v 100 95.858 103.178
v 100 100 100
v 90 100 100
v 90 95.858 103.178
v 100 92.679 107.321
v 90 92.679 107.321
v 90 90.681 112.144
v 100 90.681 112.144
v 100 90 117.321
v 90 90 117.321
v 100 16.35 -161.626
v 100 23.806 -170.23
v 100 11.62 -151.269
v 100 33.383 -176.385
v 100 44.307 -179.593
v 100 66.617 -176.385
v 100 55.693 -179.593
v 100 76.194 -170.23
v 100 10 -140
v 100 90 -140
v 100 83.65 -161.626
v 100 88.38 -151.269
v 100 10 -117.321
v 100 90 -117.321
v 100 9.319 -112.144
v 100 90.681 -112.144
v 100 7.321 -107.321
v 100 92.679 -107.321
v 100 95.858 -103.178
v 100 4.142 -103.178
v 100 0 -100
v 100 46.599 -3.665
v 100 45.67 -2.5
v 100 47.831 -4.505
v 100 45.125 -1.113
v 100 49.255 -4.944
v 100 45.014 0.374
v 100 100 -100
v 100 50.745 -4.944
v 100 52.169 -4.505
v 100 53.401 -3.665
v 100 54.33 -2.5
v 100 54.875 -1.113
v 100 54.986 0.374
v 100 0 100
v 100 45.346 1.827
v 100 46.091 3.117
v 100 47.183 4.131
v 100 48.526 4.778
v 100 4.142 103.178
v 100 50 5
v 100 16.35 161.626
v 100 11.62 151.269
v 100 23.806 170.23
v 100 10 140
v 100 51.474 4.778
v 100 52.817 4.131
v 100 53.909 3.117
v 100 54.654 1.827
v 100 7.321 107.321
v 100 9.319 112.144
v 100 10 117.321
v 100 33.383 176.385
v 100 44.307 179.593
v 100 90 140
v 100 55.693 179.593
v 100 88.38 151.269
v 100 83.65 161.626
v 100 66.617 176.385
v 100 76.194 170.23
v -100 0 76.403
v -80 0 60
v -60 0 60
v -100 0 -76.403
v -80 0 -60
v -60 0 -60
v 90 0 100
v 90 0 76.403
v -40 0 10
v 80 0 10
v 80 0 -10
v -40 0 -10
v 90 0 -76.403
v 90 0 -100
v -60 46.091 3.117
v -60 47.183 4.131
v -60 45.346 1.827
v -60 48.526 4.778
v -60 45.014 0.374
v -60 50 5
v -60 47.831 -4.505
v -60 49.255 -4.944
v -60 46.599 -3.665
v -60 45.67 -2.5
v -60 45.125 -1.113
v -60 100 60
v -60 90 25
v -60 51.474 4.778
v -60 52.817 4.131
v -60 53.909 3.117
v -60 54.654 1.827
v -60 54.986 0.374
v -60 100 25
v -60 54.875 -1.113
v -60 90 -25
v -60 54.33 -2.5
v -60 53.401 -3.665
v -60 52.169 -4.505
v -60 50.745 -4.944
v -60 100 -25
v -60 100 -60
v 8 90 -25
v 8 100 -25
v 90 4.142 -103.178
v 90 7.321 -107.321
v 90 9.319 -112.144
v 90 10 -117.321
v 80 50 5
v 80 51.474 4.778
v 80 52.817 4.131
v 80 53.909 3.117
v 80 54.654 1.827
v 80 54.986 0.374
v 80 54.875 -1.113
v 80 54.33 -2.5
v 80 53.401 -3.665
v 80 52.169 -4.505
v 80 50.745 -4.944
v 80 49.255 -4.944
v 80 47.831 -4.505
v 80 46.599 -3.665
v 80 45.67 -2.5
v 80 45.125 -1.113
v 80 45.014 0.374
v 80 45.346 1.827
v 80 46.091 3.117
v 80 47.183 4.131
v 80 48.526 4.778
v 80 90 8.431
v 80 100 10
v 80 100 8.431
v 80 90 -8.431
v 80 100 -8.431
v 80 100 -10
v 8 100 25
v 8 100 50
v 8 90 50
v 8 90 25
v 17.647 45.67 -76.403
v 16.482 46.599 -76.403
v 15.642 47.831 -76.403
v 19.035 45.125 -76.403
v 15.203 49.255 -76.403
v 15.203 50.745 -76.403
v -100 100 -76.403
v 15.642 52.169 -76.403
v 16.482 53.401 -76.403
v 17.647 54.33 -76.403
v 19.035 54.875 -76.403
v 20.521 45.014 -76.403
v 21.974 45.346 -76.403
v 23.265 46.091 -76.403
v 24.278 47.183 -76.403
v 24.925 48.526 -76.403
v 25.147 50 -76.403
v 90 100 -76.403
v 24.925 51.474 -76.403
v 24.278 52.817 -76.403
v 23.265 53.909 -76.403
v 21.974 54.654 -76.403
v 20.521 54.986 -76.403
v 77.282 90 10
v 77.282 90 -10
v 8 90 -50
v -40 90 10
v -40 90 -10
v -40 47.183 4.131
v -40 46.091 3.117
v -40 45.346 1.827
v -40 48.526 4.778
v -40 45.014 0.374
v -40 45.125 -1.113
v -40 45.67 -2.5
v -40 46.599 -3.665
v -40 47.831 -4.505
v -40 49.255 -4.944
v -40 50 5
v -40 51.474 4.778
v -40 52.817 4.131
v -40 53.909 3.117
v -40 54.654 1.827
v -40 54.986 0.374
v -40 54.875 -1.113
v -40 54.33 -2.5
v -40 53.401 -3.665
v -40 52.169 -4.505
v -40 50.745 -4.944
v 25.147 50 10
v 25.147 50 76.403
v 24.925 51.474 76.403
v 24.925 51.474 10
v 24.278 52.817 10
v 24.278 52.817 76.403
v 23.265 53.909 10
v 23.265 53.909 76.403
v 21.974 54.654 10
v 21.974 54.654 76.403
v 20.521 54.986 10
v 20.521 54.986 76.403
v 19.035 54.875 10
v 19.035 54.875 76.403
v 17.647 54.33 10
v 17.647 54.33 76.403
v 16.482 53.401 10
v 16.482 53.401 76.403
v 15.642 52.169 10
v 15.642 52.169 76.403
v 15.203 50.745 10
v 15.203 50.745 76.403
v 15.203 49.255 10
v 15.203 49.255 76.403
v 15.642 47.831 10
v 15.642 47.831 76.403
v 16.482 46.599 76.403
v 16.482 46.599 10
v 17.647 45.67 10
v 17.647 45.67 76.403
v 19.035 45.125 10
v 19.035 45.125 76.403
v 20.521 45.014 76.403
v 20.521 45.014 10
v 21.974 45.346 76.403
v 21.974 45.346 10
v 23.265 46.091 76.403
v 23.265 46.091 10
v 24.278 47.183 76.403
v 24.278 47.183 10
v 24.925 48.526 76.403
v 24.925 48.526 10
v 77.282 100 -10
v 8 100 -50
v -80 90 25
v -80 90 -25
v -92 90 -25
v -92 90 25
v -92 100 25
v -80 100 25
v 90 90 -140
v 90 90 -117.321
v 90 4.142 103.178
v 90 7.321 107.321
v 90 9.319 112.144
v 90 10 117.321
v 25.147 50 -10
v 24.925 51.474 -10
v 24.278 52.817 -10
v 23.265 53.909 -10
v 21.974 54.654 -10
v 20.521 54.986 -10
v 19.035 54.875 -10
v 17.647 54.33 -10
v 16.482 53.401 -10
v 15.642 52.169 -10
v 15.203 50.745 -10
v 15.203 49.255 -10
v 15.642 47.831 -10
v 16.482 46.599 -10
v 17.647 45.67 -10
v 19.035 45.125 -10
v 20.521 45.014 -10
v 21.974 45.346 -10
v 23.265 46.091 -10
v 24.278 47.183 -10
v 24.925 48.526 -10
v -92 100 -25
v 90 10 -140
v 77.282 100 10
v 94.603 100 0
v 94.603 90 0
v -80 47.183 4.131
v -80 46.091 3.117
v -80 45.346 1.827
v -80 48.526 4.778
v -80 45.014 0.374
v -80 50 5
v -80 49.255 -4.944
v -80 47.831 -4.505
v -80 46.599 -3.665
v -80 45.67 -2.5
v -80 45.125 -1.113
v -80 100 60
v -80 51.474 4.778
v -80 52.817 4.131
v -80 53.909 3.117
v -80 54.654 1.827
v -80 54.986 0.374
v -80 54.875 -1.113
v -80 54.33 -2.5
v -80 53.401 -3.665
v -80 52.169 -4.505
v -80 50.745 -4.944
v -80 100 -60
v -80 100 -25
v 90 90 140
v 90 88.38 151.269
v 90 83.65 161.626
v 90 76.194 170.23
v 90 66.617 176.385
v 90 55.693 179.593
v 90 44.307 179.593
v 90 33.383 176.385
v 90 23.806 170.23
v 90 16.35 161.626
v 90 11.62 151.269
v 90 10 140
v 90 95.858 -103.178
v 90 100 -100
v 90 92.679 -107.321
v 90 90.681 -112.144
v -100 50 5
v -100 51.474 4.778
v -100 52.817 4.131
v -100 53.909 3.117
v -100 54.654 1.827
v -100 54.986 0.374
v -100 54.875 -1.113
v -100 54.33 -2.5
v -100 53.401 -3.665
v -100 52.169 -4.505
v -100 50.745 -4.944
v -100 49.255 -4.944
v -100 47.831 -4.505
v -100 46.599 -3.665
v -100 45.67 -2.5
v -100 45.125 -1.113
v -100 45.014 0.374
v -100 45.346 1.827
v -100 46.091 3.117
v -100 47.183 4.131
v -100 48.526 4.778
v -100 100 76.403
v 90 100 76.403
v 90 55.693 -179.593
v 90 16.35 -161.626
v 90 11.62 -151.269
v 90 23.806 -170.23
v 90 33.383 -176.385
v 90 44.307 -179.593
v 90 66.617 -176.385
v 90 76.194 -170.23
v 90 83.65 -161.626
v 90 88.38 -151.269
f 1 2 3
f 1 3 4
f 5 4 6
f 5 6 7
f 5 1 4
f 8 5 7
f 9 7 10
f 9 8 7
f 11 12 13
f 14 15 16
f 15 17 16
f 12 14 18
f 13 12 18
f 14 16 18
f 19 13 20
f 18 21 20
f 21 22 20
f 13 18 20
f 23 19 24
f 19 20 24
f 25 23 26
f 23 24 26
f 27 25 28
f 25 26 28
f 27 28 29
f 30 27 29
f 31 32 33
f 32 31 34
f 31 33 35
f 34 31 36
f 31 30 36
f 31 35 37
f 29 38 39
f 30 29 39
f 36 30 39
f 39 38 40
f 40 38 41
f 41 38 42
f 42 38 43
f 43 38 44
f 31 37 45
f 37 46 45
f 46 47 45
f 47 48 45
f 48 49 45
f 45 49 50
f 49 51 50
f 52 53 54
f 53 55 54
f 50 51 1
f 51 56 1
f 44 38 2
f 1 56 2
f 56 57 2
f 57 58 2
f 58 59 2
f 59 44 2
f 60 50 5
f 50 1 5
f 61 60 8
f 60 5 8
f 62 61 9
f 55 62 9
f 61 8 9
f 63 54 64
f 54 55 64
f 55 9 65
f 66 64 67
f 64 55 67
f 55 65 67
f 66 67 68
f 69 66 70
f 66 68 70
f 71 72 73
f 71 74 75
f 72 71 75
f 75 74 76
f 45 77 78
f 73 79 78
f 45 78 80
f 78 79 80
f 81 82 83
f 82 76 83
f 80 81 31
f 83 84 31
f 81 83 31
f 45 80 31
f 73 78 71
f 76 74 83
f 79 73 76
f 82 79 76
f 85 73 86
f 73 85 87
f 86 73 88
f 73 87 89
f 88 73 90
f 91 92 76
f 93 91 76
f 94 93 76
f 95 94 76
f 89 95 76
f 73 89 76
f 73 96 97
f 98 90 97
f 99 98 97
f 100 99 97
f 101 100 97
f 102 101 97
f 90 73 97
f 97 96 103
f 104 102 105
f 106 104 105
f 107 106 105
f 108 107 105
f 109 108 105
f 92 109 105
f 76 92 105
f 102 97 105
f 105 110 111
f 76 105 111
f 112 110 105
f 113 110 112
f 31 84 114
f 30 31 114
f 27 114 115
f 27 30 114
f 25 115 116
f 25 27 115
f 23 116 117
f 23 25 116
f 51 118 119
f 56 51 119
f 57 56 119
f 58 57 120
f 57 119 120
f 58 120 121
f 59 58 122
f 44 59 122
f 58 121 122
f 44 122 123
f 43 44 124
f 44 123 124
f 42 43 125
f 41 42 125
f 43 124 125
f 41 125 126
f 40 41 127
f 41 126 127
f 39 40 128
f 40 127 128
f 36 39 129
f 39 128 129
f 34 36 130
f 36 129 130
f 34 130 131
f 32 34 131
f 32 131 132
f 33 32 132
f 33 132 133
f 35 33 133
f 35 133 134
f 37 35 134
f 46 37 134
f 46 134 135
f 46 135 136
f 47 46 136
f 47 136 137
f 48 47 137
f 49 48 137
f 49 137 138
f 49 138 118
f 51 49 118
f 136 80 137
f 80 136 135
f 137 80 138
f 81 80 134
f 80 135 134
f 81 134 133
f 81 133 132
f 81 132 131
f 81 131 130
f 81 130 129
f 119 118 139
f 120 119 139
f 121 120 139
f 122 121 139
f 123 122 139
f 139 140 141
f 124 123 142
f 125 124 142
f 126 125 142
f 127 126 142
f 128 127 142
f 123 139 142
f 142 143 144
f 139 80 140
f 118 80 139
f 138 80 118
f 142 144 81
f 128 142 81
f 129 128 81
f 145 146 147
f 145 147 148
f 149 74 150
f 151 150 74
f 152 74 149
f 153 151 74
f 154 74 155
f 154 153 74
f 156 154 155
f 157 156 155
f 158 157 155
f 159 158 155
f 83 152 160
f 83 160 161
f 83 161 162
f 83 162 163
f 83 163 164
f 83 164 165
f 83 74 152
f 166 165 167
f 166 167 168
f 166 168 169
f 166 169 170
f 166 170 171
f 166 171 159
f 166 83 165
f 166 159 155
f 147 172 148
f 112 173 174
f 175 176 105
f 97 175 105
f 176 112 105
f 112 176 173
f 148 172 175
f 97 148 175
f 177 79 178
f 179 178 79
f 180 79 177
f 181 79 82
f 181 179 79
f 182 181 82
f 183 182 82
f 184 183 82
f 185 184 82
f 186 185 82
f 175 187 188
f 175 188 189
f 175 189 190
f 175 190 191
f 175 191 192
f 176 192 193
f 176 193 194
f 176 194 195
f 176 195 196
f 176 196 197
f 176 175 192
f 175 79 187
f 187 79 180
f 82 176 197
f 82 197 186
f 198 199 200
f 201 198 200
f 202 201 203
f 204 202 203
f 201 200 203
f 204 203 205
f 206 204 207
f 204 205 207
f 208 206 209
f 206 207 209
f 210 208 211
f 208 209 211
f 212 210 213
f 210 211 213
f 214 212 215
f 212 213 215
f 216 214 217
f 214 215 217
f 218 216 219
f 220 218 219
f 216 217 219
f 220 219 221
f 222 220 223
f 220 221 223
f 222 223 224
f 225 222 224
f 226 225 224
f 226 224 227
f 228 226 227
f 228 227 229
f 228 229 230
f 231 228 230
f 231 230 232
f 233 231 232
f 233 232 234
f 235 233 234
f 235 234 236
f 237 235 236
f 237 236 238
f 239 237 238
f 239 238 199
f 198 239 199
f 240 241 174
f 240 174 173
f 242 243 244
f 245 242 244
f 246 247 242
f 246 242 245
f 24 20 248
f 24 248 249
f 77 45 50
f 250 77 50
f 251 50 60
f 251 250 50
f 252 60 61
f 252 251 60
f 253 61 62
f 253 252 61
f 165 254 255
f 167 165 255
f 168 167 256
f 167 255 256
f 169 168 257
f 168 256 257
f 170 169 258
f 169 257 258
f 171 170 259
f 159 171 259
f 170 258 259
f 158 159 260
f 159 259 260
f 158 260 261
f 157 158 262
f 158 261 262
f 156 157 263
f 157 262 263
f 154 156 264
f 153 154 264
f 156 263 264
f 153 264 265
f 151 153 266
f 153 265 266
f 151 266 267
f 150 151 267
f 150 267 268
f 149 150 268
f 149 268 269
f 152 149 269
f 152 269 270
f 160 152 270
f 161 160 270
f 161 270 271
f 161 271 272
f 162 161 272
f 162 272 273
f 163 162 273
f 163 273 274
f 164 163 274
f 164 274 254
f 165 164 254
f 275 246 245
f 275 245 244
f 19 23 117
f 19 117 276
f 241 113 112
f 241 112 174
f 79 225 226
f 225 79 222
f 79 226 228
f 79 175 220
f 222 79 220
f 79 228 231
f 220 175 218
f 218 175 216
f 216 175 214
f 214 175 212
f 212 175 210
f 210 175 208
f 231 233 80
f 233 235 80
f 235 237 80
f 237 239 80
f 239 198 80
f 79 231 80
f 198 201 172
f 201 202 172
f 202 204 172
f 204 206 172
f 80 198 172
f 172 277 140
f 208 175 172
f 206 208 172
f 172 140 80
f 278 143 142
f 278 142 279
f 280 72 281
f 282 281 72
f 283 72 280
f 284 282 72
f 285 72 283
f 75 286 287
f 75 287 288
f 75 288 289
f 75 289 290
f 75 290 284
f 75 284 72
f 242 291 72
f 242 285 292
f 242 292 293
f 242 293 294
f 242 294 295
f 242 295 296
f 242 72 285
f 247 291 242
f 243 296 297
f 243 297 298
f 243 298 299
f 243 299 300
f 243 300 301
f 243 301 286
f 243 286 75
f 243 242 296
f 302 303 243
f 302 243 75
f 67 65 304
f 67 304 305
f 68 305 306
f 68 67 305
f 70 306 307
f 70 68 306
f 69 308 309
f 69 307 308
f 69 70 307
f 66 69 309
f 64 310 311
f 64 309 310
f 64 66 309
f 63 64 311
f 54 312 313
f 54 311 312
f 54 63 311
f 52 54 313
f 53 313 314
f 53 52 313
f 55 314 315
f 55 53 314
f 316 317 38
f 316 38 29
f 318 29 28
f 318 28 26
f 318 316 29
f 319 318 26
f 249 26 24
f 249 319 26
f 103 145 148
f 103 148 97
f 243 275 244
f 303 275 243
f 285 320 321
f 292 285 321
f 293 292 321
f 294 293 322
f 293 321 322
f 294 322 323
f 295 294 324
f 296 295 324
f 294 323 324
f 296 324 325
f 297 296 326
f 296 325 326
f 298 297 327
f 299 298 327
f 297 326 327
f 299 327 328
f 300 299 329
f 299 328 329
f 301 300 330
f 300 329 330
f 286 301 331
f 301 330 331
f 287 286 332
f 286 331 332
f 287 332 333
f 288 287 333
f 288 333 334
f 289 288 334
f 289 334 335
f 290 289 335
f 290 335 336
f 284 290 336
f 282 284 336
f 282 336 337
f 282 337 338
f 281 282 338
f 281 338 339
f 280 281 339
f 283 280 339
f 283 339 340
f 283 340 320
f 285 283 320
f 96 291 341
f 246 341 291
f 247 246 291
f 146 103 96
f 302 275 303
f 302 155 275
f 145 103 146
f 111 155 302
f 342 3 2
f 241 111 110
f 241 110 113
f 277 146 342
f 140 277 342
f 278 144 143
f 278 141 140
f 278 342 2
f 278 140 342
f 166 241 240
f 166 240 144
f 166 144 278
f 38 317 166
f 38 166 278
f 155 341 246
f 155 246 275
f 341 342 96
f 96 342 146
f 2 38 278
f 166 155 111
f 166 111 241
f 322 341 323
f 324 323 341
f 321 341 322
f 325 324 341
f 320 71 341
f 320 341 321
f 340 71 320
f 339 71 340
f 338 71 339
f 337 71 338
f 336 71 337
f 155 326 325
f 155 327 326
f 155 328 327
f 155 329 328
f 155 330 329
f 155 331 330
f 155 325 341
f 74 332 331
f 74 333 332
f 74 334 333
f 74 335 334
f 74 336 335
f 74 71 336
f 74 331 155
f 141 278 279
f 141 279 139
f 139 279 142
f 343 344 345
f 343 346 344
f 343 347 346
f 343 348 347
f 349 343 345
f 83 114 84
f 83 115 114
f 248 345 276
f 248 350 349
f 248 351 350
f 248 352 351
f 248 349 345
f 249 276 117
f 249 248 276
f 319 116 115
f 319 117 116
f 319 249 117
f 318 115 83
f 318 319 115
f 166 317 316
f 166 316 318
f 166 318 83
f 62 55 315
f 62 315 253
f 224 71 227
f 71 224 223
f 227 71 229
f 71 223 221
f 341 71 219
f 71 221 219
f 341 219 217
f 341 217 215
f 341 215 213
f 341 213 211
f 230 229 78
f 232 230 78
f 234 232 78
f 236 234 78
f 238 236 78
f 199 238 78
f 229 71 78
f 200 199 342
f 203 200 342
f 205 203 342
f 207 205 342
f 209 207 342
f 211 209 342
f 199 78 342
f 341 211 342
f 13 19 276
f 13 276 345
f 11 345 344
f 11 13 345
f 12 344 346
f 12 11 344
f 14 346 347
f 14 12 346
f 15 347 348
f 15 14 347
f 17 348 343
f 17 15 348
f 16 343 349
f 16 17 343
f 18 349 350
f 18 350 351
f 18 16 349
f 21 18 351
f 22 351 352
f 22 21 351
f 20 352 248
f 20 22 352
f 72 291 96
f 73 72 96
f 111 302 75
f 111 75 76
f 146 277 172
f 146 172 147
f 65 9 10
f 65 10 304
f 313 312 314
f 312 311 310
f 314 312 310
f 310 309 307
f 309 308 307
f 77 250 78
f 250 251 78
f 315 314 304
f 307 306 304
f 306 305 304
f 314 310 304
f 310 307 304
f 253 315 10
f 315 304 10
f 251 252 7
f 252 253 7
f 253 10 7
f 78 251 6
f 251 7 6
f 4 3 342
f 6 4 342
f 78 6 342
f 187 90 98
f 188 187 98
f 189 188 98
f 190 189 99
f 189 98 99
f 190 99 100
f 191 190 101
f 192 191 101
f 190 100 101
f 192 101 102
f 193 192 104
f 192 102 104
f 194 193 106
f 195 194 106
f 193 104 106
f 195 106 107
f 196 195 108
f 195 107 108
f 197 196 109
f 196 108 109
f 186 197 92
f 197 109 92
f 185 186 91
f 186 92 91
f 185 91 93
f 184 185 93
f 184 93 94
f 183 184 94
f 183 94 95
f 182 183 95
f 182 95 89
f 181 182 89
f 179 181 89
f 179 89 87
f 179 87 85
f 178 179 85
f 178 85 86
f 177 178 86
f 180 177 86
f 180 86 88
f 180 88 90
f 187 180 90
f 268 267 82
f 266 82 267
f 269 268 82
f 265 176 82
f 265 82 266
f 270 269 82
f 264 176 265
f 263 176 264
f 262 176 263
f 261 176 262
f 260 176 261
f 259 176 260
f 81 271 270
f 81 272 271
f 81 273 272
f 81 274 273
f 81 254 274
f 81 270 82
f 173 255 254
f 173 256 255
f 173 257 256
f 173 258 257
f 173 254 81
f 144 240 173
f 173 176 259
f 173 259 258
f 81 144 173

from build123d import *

# Parameters (mm, degrees)
SKETCH1_W           = 200
SKETCH1_H           = 200
BOSS_EXTRUDE2_DEPTH = 100
BOSS_EXTRUDE3_DEPTH = 10
CUT_EXTRUDE1_DEPTH  = 10
SKETCH4_W           = 120
SKETCH4_H           = 20
SKETCH4_W_2         = 20
SKETCH4_H_2         = 120
CUT_EXTRUDE2_DEPTH  = 229.910462845
SKETCH5_R           = 5
CUT_EXTRUDE3_DEPTH  = 314.687742827
SKETCH6_R           = 5
CUT_EXTRUDE4_DEPTH  = 288.054001888
SKETCH7_W           = 103.597474358
SKETCH7_H           = 100
CUT_EXTRUDE7_DEPTH  = 281.178514522
FILLET1_R           = 20


with BuildPart() as part:
    # Sketch1 → Boss-Extrude2 (new body)
    with BuildSketch(Plane(origin=(0, 0, 0), x_dir=(1, 0, 0), z_dir=(0, 1, 0))):
        Rectangle(SKETCH1_W, SKETCH1_H)
    extrude(amount=BOSS_EXTRUDE2_DEPTH)

    # Sketch2 → Boss-Extrude3 (add)
    with BuildSketch(Plane.ZY.offset(-100)):
        with BuildLine():
            Line((140, 10), (-140, 10))
            ThreePointArc((-140, 10), (-180, 50), (-140, 90))
            Line((-140, 90), (140, 90))
            ThreePointArc((140, 90), (180, 50), (140, 10))
        make_face()
    extrude(amount=BOSS_EXTRUDE3_DEPTH)

    # Sketch3 → Cut-Extrude1 (cut)
    with BuildSketch(Plane(origin=(0, 100, 0), x_dir=(1, 0, 0), z_dir=(0, 1, 0))):
        Polygon((8, 25), (8, 50), (94.602540378, 0), (8, -50), (8, -25), (-92, -25), (-92, 25), align=None)
    extrude(amount=-CUT_EXTRUDE1_DEPTH, mode=Mode.SUBTRACT)

    # Sketch4 → Cut-Extrude2 (cut, through all)
    with BuildSketch(Plane(origin=(0, 100, 0), x_dir=(1, 0, 0), z_dir=(0, 1, 0))):
        with Locations((20, 0)):
            Rectangle(SKETCH4_W, SKETCH4_H)
        with Locations((-70, 0)):
            Rectangle(SKETCH4_W_2, SKETCH4_H_2)
    extrude(amount=-CUT_EXTRUDE2_DEPTH, mode=Mode.SUBTRACT)

    # Sketch5 → Cut-Extrude3 (cut, through all)
    with BuildSketch(Plane.XY.offset(100)):
        with Locations((20.147207668, 50)):
            Circle(SKETCH5_R)
    extrude(amount=-CUT_EXTRUDE3_DEPTH, mode=Mode.SUBTRACT)

    # Sketch6 → Cut-Extrude4 (cut, through all)
    with BuildSketch(Plane.ZY.offset(100)):
        with Locations((0, 50)):
            Circle(SKETCH6_R)
    extrude(amount=-CUT_EXTRUDE4_DEPTH, mode=Mode.SUBTRACT)

    # Sketch7 → Cut-Extrude7 (cut, through all)
    with BuildSketch(Plane.ZY.offset(-90)):
        with Locations((-128.201262821, 50)):
            Rectangle(SKETCH7_W, SKETCH7_H)
        with Locations((128.201262821, 50)):
            Rectangle(SKETCH7_W, SKETCH7_H)
    extrude(amount=CUT_EXTRUDE7_DEPTH, mode=Mode.SUBTRACT)

    # Fillet1
    # the kernel refuses this fillet: 20 mm, written as the material it adds along each edge
    with BuildSketch(Plane(origin=(100, 10, -100), x_dir=(0, -1, 0), z_dir=(-1, 0, 0)), Plane(origin=(90, 10, 100), x_dir=(0, -1, 0), z_dir=(1, 0, 0))) as fillet1_piece_1:
        with BuildLine():
            CenterArc((20, -17.320508076), FILLET1_R, 120, 60)
            Line((0, -17.320508076), (-0.4, -17.320508076))
            Line((-0.4, -17.320508076), (-0.4, 0))
            Line((-0.4, 0), (0, 0.4))
            ThreePointArc((0, 0.4), (5, 0.4), (9.8, 0.346410162))
            Line((9.8, 0.346410162), (10, 0))
        make_face()
    extrude(amount=10)
    with BuildSketch(Plane(origin=(90, 90, -100), x_dir=(0, 0, -1), z_dir=(1, 0, 0)), Plane(origin=(100, 90, 100), x_dir=(0, 0, 1), z_dir=(-1, 0, 0))) as fillet1_piece_2:
        with BuildLine():
            CenterArc((17.320508076, 20), FILLET1_R, 210, 60)
            Line((0, 10), (-0.346410162, 9.8))
            ThreePointArc((-0.346410162, 9.8), (-0.4, 5), (-0.4, 0))
            Line((-0.4, 0), (0, -0.4))
            Line((0, -0.4), (17.320508076, -0.4))
            Line((17.320508076, -0.4), (17.320508076, 0))
        make_face()
    extrude(amount=10)


solid = part.part
